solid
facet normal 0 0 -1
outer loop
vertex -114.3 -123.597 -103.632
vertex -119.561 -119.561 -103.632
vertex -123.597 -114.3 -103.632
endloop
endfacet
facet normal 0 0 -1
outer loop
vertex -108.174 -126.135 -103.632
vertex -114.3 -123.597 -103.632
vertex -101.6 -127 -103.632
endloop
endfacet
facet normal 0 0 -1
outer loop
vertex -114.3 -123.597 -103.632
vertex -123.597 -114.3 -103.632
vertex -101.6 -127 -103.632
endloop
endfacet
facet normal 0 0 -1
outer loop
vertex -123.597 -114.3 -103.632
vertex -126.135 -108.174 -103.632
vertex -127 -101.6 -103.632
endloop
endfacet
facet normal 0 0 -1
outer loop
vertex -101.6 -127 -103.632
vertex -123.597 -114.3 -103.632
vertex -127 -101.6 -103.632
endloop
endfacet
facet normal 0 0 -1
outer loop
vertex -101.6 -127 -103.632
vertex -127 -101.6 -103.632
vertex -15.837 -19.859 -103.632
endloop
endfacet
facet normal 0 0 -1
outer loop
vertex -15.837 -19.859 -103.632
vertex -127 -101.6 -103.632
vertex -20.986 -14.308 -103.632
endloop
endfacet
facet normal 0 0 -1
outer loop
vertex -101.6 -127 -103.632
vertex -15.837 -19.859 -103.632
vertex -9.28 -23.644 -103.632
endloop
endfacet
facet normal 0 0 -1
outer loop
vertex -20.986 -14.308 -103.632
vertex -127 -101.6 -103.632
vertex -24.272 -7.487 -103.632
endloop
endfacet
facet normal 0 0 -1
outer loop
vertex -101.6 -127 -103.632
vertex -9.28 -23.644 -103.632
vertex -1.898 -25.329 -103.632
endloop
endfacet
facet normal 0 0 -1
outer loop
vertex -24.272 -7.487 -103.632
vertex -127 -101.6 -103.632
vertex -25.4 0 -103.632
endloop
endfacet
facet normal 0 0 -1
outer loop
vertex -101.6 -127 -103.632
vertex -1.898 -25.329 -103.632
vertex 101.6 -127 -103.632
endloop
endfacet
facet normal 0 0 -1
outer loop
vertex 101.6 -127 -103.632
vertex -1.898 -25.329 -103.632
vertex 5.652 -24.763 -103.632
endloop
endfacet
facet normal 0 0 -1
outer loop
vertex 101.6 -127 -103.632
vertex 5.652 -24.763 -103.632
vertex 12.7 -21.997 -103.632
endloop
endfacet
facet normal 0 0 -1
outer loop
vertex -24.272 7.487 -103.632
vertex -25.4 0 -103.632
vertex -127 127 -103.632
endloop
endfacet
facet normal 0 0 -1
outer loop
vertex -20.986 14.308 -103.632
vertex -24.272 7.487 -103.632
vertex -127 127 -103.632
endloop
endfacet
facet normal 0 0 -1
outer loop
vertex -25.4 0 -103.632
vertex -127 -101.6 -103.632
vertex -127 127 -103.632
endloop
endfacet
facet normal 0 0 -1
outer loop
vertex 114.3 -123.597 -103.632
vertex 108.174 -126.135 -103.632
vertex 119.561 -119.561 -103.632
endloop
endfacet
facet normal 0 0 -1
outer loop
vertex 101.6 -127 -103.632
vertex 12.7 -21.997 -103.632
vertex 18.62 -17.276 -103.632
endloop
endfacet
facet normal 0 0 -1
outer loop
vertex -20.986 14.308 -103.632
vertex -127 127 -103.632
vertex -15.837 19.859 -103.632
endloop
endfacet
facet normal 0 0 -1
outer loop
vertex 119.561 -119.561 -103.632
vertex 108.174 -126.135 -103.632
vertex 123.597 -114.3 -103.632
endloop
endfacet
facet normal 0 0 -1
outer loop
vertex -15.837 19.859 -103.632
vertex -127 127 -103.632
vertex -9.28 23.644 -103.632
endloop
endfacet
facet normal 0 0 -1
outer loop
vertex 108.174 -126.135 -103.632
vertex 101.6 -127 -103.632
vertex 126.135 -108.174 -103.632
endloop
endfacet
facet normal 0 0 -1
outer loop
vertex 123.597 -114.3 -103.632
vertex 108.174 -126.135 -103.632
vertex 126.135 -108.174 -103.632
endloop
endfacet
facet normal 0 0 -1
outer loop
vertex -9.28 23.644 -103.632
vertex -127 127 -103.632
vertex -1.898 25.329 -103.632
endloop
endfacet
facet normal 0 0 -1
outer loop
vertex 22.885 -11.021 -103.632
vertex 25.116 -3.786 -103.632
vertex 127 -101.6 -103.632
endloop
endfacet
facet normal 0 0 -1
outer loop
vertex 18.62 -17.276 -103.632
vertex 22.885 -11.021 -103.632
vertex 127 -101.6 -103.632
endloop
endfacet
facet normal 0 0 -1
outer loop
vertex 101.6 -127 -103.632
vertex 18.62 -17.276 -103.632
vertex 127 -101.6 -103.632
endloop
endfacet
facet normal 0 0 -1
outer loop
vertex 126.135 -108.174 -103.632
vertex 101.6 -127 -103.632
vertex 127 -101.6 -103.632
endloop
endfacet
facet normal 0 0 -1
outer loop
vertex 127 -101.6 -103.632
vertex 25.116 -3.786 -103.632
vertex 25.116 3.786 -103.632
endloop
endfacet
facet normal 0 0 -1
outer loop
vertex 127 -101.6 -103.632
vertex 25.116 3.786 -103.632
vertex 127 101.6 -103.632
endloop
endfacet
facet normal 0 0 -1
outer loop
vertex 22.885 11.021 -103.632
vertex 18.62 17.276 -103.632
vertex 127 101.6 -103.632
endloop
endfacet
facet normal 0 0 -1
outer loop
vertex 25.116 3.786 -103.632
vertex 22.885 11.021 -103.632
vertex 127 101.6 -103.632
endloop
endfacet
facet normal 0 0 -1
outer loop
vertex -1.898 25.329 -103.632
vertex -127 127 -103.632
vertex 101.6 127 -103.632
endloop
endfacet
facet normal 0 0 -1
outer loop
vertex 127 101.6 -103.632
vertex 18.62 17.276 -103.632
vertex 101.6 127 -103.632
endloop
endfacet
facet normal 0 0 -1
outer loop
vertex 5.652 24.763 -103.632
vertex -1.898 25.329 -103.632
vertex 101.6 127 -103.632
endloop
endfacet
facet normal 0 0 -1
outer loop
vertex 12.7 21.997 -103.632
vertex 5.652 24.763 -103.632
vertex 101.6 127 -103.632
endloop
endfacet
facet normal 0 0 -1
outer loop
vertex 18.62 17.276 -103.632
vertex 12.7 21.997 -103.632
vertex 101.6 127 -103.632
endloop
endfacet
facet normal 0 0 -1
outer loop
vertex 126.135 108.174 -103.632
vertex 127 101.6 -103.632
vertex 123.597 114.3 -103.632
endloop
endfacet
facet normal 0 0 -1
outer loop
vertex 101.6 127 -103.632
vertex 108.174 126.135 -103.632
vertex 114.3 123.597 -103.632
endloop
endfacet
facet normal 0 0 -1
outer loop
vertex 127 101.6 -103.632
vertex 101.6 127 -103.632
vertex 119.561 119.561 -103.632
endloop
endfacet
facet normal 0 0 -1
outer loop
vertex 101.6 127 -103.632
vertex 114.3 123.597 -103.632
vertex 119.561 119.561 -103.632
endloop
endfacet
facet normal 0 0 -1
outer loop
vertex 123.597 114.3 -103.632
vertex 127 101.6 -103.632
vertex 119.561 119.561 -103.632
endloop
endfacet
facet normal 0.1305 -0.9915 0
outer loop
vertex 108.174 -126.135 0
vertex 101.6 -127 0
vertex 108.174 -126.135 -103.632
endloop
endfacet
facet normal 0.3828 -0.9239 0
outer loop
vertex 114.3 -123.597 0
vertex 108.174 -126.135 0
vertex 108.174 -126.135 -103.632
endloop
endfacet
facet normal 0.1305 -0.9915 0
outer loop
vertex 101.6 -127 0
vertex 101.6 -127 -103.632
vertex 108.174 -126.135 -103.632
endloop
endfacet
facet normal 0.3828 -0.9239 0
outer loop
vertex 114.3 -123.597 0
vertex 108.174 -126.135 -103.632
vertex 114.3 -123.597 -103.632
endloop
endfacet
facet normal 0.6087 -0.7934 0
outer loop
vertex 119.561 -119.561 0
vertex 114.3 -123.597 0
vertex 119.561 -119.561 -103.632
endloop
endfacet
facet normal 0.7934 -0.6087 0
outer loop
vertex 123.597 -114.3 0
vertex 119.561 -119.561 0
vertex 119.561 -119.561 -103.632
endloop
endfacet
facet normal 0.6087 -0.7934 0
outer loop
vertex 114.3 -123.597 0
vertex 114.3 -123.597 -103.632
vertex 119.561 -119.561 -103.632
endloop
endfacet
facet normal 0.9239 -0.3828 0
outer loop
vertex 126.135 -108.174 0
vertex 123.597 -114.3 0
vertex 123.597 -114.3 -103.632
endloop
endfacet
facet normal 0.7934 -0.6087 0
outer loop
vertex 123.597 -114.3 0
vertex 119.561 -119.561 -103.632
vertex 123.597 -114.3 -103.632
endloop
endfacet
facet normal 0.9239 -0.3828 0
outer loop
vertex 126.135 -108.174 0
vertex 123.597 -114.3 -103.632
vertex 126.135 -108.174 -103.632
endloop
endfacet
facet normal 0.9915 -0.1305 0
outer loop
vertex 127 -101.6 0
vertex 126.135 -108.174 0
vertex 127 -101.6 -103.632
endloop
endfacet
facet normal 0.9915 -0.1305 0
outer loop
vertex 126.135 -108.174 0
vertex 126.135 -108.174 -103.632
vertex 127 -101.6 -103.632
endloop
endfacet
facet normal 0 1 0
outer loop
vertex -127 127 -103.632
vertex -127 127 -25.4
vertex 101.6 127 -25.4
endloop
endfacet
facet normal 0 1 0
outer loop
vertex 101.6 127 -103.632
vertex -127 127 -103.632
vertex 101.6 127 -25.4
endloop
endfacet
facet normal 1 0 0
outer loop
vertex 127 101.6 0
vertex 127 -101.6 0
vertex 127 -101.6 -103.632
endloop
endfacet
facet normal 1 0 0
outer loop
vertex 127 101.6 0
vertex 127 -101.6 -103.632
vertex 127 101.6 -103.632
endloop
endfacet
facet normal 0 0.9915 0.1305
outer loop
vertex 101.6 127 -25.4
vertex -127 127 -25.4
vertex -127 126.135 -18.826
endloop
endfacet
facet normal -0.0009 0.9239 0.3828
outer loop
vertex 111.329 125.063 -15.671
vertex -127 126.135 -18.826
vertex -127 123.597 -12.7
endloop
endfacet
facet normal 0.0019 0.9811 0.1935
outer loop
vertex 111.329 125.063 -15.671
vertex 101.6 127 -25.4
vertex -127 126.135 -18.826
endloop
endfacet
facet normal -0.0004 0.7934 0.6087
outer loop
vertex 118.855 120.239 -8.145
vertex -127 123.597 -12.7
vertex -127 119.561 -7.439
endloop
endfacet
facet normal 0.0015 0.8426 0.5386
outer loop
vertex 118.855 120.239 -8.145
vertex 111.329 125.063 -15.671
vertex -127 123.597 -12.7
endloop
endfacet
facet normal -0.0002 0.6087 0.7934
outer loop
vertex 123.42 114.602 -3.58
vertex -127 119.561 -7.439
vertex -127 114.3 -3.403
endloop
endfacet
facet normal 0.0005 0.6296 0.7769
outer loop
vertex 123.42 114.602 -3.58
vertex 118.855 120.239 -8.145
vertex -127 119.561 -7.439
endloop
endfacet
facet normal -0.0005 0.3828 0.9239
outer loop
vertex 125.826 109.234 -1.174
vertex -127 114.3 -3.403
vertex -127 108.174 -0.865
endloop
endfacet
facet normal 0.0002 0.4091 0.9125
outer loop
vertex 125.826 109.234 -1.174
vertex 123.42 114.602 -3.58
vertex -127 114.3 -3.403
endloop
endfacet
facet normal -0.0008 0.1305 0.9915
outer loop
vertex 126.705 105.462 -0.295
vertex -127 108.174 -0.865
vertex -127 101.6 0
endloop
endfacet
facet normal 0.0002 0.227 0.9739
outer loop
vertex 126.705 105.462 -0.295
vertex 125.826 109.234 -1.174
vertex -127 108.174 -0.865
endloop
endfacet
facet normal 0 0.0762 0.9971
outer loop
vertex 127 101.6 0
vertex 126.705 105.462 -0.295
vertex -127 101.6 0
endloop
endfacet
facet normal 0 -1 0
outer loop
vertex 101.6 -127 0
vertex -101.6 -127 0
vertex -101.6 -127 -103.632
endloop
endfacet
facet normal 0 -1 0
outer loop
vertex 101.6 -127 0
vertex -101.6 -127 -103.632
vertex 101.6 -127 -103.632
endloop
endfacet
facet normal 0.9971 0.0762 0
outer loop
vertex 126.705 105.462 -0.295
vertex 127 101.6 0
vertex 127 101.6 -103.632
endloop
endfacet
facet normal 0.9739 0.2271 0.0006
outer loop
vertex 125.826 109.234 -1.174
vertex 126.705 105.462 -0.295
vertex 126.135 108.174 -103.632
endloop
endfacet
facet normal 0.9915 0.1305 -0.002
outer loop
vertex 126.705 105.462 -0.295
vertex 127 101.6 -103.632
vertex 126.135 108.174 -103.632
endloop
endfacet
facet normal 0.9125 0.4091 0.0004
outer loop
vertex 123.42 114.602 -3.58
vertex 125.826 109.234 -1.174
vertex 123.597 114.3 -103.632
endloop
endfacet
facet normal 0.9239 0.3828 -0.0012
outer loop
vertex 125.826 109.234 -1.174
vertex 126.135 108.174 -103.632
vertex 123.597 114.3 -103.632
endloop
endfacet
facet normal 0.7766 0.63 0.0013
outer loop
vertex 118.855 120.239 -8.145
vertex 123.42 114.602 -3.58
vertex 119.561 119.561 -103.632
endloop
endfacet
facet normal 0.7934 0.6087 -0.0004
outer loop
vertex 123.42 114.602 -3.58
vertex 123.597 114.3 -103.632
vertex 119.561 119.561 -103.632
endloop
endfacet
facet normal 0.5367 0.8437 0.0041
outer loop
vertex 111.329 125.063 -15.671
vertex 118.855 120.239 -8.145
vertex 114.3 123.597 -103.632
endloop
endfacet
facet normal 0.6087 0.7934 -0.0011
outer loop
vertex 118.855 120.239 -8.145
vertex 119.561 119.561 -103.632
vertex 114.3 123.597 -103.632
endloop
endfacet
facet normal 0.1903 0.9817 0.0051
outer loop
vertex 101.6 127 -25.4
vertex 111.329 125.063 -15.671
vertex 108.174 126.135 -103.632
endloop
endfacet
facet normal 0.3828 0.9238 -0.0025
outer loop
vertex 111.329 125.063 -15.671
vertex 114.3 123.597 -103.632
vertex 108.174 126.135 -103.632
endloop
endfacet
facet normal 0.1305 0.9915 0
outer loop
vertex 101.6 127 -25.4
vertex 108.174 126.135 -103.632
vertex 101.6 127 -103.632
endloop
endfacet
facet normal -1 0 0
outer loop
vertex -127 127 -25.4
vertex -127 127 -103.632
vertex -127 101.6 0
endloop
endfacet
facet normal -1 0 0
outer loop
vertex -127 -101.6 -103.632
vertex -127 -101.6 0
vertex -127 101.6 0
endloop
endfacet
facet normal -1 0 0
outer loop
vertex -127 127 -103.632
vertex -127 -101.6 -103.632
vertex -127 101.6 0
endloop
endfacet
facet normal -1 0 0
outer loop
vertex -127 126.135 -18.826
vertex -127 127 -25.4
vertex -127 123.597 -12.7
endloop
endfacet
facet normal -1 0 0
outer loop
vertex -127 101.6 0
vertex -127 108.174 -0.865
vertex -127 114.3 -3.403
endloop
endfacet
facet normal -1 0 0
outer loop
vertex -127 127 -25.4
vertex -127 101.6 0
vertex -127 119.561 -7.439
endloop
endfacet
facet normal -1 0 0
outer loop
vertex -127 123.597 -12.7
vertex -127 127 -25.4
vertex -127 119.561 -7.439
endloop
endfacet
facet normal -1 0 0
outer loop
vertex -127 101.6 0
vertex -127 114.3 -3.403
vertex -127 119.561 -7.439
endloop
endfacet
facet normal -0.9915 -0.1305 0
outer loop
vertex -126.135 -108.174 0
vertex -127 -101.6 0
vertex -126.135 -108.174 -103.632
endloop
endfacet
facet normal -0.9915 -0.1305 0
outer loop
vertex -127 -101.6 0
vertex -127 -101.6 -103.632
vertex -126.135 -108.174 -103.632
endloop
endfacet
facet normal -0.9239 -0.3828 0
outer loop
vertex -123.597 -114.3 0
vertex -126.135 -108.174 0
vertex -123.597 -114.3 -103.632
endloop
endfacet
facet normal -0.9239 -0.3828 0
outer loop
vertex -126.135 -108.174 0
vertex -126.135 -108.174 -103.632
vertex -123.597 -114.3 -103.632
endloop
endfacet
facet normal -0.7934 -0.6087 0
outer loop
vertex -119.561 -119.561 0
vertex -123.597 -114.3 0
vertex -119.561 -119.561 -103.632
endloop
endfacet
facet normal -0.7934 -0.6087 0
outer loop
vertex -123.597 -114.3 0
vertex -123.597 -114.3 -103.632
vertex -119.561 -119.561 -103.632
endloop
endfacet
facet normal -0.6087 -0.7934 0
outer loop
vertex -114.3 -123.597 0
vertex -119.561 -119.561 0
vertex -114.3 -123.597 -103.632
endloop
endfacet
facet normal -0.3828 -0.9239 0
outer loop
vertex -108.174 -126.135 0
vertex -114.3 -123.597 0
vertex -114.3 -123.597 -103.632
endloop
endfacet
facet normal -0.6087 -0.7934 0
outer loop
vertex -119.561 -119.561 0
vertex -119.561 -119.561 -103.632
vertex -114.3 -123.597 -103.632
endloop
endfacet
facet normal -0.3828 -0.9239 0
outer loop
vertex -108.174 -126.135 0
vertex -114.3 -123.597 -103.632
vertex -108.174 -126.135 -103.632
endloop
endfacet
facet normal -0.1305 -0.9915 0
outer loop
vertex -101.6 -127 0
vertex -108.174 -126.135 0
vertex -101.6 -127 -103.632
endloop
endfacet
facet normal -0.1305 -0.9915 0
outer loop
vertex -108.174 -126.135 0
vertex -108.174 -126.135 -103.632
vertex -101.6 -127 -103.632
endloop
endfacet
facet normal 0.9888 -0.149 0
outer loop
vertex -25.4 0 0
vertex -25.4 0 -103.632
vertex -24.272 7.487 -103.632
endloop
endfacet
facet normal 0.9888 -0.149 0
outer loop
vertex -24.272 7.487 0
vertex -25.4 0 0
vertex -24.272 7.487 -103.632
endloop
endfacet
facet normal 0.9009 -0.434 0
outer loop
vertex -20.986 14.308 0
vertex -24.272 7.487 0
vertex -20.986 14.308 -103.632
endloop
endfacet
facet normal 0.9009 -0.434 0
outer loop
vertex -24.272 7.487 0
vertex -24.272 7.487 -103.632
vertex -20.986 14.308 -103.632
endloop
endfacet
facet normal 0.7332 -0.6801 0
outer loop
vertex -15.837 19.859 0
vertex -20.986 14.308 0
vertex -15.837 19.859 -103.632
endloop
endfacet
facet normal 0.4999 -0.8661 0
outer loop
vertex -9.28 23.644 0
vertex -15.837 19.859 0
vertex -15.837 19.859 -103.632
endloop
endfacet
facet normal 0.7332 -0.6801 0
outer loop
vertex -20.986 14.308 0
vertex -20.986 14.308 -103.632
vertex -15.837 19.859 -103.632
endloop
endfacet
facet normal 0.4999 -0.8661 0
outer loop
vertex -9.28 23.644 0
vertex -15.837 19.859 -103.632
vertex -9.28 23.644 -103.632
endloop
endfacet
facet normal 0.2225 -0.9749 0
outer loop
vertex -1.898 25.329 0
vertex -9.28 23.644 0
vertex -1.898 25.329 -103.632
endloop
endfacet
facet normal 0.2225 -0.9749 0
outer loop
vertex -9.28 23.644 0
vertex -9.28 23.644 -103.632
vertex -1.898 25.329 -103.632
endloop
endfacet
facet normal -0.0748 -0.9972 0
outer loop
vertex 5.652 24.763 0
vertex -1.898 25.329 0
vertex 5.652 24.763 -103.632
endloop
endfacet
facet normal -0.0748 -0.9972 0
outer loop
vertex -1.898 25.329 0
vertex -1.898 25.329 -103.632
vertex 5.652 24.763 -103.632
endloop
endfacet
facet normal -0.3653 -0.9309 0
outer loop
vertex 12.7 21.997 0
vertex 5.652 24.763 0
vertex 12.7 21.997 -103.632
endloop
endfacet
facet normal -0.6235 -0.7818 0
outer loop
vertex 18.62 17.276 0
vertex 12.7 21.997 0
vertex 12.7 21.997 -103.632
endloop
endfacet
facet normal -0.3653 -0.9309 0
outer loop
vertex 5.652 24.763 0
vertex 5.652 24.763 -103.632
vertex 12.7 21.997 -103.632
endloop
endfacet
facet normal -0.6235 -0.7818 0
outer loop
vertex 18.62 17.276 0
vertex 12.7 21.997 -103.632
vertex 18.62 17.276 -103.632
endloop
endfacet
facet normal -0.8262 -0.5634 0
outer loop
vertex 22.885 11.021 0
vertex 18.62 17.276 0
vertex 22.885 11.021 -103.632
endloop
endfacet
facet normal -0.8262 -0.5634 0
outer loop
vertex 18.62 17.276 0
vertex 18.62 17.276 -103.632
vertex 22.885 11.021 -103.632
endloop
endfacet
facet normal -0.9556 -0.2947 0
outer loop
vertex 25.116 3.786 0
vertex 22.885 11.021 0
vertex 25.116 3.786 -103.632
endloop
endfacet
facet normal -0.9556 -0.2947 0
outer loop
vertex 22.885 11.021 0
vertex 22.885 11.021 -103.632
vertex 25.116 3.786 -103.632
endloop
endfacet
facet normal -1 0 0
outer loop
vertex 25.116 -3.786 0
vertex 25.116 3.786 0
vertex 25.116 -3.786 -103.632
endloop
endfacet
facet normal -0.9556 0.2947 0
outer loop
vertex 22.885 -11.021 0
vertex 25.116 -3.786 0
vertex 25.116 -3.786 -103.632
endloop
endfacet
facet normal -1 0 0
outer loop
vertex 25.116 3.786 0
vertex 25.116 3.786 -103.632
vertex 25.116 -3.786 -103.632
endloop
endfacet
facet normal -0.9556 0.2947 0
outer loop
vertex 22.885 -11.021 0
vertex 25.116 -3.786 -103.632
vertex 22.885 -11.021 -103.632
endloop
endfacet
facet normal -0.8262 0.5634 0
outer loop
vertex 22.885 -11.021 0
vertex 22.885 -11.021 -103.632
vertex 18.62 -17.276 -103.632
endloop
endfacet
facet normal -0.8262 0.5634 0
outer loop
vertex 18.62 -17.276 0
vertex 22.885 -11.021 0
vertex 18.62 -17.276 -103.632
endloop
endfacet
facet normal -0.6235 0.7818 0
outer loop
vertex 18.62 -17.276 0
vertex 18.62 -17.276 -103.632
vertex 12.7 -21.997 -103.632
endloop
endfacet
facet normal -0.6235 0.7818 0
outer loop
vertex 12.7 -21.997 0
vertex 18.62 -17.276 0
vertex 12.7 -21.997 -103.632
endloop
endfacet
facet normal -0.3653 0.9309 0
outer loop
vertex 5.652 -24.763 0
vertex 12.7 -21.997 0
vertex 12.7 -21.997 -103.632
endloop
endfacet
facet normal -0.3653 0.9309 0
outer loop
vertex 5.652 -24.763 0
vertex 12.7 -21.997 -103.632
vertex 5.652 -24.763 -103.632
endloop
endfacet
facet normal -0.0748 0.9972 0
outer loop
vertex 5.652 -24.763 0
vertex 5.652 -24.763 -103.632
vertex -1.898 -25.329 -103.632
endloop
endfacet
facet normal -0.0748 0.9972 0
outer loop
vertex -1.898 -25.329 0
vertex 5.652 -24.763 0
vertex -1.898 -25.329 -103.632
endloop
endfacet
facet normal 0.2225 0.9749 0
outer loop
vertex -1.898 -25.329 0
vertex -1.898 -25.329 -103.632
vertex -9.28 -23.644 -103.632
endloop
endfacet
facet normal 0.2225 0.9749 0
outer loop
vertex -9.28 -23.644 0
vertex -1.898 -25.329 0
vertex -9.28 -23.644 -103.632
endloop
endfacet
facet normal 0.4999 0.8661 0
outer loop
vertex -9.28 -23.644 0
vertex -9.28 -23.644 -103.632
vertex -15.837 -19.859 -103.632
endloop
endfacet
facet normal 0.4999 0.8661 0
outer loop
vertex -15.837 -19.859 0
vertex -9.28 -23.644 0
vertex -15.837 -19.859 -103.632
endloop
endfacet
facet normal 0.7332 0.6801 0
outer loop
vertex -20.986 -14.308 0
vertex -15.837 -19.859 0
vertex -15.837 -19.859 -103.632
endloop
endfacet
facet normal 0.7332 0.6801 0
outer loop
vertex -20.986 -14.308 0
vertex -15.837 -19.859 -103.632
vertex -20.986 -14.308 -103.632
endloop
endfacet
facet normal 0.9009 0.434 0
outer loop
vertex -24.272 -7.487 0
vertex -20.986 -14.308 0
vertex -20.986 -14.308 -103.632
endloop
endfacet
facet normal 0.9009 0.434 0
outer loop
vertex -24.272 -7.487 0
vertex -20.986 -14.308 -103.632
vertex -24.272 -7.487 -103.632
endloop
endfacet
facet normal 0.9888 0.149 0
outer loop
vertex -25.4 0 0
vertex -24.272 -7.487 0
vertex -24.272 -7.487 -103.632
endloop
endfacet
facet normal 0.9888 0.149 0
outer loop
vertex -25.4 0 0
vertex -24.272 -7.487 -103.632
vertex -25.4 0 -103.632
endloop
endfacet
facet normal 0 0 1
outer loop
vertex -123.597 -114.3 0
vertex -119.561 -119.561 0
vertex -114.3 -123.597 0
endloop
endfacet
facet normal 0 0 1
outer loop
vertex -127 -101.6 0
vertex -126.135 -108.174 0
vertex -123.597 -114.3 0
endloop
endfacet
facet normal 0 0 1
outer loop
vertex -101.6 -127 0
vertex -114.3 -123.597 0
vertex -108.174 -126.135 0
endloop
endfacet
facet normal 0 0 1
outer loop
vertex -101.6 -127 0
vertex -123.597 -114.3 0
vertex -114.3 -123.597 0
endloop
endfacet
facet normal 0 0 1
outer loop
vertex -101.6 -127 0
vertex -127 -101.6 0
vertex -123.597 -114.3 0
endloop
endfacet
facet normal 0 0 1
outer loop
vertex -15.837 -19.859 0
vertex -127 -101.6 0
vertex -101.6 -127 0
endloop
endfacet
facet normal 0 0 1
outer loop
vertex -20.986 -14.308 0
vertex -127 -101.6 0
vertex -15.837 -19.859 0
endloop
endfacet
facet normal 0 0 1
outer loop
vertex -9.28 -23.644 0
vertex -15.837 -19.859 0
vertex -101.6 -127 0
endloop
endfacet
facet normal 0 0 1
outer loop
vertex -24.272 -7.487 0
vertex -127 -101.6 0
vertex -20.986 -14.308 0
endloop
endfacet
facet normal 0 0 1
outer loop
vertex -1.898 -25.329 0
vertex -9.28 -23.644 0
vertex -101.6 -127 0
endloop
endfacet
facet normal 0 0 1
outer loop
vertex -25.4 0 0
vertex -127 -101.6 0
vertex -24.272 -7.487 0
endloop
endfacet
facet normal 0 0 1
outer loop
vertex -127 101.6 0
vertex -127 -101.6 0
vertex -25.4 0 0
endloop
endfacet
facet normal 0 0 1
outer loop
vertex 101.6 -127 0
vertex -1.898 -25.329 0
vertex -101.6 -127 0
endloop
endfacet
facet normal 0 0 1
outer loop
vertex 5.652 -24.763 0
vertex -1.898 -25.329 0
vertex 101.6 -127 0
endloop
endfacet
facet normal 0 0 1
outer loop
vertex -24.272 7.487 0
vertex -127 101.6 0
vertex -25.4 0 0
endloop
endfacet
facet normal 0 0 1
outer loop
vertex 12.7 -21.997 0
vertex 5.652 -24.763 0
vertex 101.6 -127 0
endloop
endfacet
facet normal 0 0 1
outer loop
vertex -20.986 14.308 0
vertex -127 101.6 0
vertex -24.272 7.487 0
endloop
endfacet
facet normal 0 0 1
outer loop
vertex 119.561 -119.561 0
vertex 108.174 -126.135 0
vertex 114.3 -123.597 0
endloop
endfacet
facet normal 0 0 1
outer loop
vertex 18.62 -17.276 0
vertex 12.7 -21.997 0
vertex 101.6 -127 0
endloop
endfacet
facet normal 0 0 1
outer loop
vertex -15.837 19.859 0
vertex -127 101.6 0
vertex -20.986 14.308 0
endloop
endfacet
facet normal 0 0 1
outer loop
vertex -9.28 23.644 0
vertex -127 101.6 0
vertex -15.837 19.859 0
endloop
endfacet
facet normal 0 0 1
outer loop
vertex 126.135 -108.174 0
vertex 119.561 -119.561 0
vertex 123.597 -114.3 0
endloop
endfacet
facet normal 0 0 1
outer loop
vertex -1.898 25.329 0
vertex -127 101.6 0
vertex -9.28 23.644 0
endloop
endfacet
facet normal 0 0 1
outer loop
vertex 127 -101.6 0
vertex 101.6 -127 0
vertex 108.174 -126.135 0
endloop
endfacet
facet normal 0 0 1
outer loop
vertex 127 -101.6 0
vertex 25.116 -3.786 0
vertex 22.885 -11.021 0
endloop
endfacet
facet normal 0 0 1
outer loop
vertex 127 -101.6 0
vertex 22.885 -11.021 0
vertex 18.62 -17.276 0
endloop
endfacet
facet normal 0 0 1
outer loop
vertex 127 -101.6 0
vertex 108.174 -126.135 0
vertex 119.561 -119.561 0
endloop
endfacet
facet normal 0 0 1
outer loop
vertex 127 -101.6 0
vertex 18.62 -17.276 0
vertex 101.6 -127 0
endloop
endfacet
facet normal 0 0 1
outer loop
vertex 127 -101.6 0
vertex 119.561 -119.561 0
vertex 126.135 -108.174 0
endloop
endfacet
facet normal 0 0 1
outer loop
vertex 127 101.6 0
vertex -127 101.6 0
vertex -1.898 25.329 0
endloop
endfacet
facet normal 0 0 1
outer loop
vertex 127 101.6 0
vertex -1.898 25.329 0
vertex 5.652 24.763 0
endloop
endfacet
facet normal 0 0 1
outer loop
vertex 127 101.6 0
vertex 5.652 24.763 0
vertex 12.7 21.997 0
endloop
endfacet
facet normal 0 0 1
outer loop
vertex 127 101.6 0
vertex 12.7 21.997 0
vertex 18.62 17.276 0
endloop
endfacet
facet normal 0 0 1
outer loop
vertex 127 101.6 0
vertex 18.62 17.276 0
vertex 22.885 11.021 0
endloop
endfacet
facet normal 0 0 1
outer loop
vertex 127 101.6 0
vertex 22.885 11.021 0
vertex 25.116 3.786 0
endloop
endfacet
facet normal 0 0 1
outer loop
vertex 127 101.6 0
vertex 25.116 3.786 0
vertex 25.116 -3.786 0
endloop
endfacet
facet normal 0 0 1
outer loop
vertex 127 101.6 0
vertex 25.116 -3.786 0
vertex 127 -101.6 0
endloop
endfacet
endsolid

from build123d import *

# Parameters (mm, degrees)
F0_W     = 254
F0_H     = 254
F1_DEPTH = 103.632
F2_R     = 25.4
F4_D     = 50.8


with BuildPart() as f1:
    # F0 (on Top) → F1 (new body)
    with BuildSketch(Plane.XY):
        Rectangle(F0_W, F0_H)
    extrude(amount=-F1_DEPTH)

    # F2
    f2_edges = [f1.edges().sort_by_distance(p)[0] for p in [
        (-127, -127, -51.816),
        (0, 127, 0),
        (127, 127, -51.816),
        (127, -127, -51.816),
    ]]
    fillet(f2_edges, radius=F2_R)

    # F4 (through all)
    with Locations(Plane.XY):
        with Locations((0, 0)):
            Hole(F4_D / 2)


solid = f1.part
